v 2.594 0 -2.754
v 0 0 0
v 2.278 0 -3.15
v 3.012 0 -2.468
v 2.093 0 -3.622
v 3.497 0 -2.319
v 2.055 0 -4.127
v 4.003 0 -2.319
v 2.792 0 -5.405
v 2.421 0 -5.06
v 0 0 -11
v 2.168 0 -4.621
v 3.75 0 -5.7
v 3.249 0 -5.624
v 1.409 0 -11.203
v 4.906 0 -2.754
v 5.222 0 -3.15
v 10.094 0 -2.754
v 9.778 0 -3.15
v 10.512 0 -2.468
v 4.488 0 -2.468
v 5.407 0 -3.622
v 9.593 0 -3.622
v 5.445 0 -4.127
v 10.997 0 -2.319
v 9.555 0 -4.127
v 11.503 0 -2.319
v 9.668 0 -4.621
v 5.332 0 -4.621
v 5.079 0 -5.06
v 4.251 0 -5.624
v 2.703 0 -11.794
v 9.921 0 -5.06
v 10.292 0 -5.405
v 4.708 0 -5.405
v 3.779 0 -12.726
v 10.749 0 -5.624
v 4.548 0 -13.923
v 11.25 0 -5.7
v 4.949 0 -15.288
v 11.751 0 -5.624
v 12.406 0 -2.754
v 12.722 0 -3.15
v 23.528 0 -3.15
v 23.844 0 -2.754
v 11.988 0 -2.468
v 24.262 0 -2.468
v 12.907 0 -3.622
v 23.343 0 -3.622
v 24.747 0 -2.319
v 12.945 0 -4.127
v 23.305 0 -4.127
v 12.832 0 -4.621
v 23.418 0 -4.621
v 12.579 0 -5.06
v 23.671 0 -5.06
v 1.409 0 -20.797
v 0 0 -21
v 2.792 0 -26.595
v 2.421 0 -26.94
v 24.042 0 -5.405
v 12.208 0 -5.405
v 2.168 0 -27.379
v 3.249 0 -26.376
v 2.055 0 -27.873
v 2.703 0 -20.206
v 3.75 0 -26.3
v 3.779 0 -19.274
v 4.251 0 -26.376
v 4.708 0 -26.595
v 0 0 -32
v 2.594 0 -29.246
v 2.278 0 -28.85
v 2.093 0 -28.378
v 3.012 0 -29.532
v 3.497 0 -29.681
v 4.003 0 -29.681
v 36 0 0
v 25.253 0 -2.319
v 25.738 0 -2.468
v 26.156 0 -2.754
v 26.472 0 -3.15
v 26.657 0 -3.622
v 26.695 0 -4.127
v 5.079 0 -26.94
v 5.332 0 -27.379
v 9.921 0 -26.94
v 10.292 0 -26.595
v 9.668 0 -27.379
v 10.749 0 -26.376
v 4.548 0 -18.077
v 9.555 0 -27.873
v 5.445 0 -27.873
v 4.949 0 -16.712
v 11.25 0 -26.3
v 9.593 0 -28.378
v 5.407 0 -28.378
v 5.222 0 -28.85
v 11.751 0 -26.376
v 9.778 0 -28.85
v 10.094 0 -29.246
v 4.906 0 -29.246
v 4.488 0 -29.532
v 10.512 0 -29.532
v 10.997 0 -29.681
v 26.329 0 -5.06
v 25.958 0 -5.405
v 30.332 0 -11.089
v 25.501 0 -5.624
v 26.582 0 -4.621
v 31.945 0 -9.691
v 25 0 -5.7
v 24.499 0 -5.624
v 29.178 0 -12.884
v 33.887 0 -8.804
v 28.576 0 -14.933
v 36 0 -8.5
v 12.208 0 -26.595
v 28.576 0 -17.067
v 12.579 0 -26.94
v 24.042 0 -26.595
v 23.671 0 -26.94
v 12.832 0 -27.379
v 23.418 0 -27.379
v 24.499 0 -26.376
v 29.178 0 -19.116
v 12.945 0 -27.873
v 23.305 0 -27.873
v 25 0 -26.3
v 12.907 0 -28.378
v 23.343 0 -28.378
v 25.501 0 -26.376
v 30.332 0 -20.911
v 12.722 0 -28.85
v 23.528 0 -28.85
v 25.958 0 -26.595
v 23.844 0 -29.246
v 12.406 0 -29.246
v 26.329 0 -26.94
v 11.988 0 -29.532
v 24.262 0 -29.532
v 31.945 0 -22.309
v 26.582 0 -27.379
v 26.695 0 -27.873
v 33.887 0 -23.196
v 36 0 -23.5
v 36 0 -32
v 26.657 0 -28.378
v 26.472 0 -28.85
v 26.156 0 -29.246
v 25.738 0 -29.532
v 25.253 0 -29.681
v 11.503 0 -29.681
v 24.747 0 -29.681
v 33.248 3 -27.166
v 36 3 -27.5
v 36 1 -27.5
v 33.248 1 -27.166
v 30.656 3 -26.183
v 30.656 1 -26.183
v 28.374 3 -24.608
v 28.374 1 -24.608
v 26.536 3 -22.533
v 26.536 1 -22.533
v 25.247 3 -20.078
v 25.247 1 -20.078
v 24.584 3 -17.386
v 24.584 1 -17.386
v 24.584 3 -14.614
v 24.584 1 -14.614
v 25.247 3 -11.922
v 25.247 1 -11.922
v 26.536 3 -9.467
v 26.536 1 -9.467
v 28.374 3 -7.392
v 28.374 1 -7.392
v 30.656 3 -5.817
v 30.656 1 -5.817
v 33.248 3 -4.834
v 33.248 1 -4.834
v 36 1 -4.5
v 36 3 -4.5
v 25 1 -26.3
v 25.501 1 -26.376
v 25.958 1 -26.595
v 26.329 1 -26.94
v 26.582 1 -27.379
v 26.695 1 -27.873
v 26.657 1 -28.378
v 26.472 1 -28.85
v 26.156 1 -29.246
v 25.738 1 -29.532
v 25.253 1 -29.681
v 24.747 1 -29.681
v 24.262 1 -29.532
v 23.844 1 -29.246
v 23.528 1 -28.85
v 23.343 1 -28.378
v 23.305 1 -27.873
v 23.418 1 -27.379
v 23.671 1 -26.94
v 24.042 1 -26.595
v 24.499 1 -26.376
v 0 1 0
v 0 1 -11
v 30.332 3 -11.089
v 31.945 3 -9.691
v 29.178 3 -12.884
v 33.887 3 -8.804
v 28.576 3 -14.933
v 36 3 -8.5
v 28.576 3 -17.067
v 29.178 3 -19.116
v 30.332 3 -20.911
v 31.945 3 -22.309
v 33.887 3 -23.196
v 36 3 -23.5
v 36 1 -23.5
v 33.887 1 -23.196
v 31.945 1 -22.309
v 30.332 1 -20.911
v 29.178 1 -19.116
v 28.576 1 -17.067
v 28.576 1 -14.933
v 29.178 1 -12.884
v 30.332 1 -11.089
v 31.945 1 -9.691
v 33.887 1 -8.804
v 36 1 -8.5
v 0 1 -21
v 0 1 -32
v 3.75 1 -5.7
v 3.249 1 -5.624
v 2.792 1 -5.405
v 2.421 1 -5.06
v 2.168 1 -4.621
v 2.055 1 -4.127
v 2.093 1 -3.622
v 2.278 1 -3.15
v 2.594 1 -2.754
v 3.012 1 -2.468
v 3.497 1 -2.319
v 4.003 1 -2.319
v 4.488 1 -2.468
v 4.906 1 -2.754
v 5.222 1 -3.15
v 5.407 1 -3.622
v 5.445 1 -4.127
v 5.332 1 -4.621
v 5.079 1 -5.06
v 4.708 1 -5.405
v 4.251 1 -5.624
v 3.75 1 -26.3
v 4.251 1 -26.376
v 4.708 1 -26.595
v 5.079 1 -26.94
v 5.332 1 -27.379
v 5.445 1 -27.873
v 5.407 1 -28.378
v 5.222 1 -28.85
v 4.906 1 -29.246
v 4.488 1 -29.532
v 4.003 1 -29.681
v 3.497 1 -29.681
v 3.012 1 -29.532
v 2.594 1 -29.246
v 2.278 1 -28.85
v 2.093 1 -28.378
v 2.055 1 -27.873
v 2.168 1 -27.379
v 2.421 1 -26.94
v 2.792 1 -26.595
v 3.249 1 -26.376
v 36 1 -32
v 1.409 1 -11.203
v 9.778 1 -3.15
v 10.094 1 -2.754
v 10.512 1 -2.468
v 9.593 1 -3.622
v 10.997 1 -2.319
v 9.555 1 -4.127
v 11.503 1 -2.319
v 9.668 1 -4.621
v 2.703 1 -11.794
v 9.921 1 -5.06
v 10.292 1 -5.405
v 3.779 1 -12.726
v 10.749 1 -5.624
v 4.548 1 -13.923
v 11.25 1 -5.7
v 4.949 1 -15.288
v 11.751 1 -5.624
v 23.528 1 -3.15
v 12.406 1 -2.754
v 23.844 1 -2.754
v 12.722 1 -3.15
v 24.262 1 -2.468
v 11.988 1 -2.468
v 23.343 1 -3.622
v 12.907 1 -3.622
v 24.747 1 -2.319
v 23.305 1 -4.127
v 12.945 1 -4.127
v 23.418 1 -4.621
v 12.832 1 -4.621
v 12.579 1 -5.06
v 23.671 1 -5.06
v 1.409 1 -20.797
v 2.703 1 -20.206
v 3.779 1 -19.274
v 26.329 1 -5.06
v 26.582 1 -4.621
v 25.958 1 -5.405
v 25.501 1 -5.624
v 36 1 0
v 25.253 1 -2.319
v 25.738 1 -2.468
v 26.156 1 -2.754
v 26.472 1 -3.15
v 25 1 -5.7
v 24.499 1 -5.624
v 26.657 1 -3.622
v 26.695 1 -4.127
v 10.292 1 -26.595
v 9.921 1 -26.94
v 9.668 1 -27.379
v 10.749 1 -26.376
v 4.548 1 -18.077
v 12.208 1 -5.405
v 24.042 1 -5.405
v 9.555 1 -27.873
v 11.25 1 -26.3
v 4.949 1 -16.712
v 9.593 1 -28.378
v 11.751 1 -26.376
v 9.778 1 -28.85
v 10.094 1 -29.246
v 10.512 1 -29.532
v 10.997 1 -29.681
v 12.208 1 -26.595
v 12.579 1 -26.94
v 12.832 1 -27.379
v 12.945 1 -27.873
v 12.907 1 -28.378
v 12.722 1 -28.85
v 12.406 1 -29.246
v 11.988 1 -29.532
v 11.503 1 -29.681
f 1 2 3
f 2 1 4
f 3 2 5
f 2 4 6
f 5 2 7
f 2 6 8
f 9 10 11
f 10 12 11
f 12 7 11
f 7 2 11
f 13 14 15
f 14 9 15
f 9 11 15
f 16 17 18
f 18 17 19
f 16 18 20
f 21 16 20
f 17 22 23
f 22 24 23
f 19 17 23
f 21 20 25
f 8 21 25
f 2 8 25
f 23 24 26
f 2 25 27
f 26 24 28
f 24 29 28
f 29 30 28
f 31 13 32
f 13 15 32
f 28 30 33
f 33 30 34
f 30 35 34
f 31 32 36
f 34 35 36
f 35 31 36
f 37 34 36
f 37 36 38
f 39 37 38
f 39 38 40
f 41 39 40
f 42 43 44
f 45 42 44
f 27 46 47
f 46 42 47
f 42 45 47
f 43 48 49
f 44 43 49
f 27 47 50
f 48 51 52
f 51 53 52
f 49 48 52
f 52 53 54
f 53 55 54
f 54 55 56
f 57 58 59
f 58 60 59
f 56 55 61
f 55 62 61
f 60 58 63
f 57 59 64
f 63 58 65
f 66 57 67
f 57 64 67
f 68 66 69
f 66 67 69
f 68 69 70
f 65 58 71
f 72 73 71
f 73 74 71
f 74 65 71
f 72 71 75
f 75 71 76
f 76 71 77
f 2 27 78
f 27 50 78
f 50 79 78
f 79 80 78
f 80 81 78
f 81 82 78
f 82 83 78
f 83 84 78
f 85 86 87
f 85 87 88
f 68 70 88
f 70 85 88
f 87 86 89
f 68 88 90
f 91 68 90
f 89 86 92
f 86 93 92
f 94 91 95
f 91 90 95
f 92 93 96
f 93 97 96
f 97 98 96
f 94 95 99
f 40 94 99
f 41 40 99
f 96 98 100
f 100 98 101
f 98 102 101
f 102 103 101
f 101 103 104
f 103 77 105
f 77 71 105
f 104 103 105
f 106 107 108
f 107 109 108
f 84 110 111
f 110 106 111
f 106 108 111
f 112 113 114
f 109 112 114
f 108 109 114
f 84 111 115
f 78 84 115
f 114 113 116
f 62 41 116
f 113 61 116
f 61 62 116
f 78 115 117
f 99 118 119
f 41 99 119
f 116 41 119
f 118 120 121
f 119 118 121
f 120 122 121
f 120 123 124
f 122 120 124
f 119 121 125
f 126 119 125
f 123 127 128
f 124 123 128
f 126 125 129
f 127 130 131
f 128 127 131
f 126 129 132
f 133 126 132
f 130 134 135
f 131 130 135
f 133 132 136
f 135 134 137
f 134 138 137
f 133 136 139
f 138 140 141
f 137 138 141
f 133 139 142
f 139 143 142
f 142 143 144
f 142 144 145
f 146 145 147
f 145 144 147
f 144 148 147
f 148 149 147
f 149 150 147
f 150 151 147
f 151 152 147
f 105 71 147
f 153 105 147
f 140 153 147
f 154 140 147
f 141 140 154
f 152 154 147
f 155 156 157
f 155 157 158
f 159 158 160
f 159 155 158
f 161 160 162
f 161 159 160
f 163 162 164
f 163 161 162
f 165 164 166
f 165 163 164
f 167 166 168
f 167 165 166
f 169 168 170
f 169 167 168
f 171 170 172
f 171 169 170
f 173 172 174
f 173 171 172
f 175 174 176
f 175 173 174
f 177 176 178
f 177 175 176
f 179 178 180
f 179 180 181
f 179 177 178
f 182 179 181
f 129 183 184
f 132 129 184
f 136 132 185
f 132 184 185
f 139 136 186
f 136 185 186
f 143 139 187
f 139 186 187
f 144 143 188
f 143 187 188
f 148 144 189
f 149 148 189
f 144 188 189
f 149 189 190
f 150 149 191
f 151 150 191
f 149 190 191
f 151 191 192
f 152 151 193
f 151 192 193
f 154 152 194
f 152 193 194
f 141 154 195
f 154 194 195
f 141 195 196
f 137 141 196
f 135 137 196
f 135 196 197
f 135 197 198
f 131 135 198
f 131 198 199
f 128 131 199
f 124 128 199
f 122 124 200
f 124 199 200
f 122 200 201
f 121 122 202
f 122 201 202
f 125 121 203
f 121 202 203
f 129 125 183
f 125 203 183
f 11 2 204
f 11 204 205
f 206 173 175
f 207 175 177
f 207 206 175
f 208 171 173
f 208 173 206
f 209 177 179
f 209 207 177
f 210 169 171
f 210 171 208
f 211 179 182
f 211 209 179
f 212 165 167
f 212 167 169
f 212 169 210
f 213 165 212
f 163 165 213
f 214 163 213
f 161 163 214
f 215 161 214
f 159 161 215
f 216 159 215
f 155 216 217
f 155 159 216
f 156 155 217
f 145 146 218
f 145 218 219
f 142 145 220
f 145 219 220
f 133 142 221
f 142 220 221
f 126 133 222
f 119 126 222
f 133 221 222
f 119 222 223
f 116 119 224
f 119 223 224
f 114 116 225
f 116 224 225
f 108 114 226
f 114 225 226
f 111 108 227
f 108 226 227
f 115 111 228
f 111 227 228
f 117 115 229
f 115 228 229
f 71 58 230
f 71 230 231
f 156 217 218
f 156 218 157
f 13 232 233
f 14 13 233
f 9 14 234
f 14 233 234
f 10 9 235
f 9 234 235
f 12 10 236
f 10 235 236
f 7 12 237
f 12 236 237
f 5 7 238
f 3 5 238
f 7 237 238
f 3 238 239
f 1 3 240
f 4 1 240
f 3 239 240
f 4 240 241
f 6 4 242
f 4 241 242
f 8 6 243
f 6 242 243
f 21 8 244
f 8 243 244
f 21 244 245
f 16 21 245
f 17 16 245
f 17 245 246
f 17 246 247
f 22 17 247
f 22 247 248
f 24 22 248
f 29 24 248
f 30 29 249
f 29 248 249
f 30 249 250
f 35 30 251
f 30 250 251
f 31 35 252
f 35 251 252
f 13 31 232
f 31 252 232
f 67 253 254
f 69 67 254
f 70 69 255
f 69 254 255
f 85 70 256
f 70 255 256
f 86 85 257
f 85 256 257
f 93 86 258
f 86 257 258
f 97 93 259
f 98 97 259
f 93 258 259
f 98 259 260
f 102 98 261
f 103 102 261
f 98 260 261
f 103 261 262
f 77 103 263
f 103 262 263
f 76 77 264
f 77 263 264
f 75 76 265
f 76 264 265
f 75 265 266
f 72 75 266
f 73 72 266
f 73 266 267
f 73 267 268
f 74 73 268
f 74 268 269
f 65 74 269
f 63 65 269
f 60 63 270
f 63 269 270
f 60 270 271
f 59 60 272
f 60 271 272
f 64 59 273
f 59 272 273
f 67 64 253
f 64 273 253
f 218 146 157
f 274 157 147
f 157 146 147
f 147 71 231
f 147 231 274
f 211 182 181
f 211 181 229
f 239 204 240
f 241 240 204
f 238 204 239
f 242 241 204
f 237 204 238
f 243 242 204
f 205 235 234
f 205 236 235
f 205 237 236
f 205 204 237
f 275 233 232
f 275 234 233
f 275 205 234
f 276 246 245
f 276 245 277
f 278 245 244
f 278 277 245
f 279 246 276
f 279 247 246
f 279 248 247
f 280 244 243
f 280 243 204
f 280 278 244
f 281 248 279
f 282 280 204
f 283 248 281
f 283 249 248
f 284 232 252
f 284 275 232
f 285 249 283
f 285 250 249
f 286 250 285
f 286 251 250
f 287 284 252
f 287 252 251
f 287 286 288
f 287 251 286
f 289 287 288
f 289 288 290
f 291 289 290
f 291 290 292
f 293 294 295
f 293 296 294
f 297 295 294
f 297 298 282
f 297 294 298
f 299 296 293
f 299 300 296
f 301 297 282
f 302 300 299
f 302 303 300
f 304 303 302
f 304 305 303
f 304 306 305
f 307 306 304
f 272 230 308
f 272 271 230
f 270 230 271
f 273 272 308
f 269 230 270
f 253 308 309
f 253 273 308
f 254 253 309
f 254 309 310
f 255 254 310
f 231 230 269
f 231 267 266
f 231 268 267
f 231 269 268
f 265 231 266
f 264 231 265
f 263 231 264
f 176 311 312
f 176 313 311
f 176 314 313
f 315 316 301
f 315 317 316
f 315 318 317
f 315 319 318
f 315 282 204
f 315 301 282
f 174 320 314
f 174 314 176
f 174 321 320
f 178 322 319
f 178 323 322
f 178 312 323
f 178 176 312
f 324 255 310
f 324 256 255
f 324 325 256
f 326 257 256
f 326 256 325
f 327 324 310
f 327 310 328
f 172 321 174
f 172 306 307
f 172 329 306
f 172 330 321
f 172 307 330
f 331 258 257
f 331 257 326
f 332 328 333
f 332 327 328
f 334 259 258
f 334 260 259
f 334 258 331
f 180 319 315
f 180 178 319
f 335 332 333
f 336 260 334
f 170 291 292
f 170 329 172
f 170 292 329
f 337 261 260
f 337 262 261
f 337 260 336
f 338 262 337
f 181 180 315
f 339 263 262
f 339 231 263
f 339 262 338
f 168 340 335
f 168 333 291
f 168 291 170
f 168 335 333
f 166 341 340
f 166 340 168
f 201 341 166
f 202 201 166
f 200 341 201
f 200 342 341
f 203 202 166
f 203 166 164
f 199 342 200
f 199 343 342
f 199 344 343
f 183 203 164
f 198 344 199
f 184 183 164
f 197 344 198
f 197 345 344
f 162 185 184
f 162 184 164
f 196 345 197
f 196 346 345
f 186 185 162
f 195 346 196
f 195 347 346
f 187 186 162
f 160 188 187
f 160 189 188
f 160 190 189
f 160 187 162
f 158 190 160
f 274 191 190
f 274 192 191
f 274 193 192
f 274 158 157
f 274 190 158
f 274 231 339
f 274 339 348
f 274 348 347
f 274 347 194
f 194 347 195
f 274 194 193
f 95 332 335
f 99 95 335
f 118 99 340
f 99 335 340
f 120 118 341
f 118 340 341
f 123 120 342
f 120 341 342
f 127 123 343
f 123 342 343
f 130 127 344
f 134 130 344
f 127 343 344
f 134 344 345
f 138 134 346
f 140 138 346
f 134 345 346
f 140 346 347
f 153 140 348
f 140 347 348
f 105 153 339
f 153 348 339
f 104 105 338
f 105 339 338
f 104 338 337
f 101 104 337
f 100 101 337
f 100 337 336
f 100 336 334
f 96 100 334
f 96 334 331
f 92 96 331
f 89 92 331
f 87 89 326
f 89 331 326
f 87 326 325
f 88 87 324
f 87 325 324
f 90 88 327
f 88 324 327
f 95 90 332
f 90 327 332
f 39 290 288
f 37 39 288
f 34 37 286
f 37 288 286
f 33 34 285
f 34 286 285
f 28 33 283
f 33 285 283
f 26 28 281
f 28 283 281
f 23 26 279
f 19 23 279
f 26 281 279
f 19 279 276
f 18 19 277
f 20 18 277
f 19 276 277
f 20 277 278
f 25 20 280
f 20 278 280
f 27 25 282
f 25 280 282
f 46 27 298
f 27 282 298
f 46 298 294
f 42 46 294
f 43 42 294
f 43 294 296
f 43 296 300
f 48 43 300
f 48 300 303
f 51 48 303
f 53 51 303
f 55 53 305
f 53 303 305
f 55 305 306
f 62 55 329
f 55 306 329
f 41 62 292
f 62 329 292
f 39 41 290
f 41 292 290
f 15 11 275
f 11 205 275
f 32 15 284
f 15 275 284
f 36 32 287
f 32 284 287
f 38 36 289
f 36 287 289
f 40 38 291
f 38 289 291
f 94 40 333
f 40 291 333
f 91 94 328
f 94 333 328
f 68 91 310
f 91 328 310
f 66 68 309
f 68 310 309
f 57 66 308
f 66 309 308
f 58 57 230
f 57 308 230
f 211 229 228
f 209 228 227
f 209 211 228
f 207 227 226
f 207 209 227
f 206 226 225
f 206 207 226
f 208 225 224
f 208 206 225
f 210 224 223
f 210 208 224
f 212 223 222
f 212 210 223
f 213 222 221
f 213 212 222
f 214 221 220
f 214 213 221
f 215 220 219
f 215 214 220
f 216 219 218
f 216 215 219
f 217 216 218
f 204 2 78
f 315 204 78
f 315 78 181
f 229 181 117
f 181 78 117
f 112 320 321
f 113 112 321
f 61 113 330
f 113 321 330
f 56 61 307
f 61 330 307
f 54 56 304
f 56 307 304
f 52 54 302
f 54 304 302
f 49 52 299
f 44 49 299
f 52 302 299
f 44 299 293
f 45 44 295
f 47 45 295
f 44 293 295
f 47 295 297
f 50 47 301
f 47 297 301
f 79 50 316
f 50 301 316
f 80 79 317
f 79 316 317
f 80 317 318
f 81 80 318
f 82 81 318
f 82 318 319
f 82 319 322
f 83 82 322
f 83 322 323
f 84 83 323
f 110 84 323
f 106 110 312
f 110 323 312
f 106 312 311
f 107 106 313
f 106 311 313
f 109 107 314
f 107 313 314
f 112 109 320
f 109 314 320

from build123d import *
from build123d.topology import SkipClean

# Parameters (mm, degrees)
SKETCH1_W           = 36
SKETCH1_H           = 32
BOSS_EXTRUDE1_DEPTH = 1
SKETCH2_R           = 1.7
SKETCH2_R_2         = 7.5
SKETCH2_R_3         = 5
CUT_EXTRUDE1_DEPTH  = 1
BOSS_EXTRUDE2_START = 2
BOSS_EXTRUDE2_DEPTH = 2


with BuildPart() as part:
    # Sketch1 → Boss-Extrude1 (new body)
    with BuildSketch(Plane(origin=(0, 0, 0), x_dir=(1, 0, 0), z_dir=(0, 1, 0))):
        with Locations((18, 16)):
            Rectangle(SKETCH1_W, SKETCH1_H)
    extrude(amount=BOSS_EXTRUDE1_DEPTH)

    # Sketch2 → Cut-Extrude1 (cut)
    with BuildSketch(Plane(origin=(0, 1, 0), x_dir=(1, 0, 0), z_dir=(0, 1, 0))):
        with Locations(Location((3.75, 28, 0), (0, 0, 270))):
            Circle(SKETCH2_R)
        with Locations(Location((11.25, 28, 0), (0, 0, 270))):
            Circle(SKETCH2_R)
        with Locations(Location((25, 28, 0), (0, 0, 270))):
            Circle(SKETCH2_R)
        with Locations((36, 16)):
            Circle(SKETCH2_R_2)
        with Locations(Location((25, 4, 0), (0, 0, 90))):
            Circle(SKETCH2_R)
        with Locations(Location((11.25, 4, 0), (0, 0, 90))):
            Circle(SKETCH2_R)
        with Locations(Location((3.75, 4, 0), (0, 0, 90))):
            Circle(SKETCH2_R)
        with Locations((0, 16)):
            Circle(SKETCH2_R_3)
    extrude(amount=-CUT_EXTRUDE1_DEPTH, mode=Mode.SUBTRACT)

    # Sketch3 → Boss-Extrude2 (add)
    with SkipClean():  # the faces are left unmerged after this step: merging them gives an invalid solid
        with BuildSketch(Plane(origin=(0, 1, 0), x_dir=(1, 0, 0), z_dir=(0, 1, 0)).offset(BOSS_EXTRUDE2_START)):
            with BuildLine():
                Line((36, 23.5), (36, 27.5))
                ThreePointArc((36, 27.5), (24.5, 16), (36, 4.5))
                Line((36, 4.5), (36, 8.5))
                ThreePointArc((36, 8.5), (28.5, 16), (36, 23.5))
            make_face()
        extrude(amount=-BOSS_EXTRUDE2_DEPTH)


solid = part.part
